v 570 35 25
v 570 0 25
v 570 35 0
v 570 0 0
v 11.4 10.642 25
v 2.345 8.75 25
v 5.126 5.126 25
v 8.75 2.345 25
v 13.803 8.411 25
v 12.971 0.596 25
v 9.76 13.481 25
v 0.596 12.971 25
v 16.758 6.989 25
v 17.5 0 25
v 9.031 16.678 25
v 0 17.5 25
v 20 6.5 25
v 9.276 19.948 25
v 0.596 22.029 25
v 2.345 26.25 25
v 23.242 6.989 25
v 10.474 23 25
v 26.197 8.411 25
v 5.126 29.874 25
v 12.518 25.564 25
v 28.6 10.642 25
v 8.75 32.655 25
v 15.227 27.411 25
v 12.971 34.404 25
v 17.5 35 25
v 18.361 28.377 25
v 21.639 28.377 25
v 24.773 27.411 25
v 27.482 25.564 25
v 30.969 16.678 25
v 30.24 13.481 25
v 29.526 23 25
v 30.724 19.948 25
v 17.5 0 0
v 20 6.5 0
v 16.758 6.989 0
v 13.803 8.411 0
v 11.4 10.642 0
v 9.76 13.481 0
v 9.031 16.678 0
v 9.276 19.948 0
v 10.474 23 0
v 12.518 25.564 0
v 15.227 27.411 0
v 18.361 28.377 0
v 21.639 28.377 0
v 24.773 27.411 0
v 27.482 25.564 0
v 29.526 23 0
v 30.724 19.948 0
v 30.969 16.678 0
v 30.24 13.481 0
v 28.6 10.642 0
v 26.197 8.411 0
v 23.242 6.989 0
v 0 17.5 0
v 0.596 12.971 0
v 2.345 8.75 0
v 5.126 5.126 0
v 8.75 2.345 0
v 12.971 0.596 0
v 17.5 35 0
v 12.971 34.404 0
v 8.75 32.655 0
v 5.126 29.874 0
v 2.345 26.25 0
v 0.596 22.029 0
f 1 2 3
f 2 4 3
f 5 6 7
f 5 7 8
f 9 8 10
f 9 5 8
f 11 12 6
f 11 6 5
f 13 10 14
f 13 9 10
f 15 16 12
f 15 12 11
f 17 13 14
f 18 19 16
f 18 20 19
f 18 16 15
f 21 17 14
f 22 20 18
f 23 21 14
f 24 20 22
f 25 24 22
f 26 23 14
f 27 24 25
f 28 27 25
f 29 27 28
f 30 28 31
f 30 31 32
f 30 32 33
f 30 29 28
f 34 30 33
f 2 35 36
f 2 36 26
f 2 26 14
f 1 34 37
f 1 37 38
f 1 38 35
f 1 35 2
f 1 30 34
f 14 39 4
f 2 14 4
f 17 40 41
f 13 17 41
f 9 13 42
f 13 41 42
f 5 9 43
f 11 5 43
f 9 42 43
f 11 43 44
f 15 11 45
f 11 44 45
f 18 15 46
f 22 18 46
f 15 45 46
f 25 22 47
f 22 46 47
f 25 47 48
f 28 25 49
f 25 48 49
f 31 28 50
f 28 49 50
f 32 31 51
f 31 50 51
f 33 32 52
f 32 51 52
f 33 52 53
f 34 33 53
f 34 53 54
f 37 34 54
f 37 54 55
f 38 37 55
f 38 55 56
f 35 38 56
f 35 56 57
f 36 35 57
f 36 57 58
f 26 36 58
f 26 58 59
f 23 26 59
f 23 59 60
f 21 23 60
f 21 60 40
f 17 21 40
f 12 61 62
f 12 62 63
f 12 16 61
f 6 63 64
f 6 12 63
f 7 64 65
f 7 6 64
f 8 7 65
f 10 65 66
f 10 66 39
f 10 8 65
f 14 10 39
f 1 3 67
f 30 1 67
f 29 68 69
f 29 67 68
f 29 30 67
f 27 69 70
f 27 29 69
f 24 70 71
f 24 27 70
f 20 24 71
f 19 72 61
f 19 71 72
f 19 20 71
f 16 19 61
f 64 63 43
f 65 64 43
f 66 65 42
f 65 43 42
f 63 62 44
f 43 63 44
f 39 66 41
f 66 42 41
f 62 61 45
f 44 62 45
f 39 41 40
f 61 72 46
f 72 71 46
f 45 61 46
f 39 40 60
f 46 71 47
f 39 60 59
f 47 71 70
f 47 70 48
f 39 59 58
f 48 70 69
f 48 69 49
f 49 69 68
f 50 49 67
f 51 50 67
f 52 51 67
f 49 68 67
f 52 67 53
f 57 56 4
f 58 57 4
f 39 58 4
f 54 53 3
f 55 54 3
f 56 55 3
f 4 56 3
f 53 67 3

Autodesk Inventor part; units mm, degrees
ref_plane "YZ Plane" through (0, 0, 0) normal (1, 0, 0) x (0, 1, 0)
ref_plane "XZ Plane" through (0, 0, 0) normal (0, 1, 0) x (-1, 0, 0)
ref_plane "XY Plane" through (0, 0, 0) normal (0, 0, 1) x (1, 0, 0)
sketch "Sketch3" plane through (0, 0, 0) normal (0, 0, 1) x (1, 0, 0)
  line L0 (0, 0) -> (570, 0)
  line L1 (570, 0) -> (570, 35)
  line L2 (570, 35) -> (0, 35)
  line L3 (0, 35) -> (0, 0)
  dimension "d3" = 570
  dimension "d4" = 35
extrude "Extrusion2" add sketch "Sketch3" along normal blind 25
sketch "Sketch4" plane through (0, 0, 25) normal (0, 0, 1) x (1, 0, 0)
  point P0 (0, 0)
sketch "Sketch5" plane through (0, 0, 25) normal (0, 0, 1) x (1, 0, 0)
  line L0 (0, 35) -> (0, 0) projected
  point P0 (20, 17.5)
hole "Hole1" at (20, 17.5, 25) direction (0, 0, -1) diameter 22 end through all
fillet "Fillet4" radius 17.5 1 edges at (0, 35, 12.5)
fillet "Fillet5" radius 17.5 1 edges at (0, 0, 12.5)
properties part number "RoboArm 2020 Arm"
